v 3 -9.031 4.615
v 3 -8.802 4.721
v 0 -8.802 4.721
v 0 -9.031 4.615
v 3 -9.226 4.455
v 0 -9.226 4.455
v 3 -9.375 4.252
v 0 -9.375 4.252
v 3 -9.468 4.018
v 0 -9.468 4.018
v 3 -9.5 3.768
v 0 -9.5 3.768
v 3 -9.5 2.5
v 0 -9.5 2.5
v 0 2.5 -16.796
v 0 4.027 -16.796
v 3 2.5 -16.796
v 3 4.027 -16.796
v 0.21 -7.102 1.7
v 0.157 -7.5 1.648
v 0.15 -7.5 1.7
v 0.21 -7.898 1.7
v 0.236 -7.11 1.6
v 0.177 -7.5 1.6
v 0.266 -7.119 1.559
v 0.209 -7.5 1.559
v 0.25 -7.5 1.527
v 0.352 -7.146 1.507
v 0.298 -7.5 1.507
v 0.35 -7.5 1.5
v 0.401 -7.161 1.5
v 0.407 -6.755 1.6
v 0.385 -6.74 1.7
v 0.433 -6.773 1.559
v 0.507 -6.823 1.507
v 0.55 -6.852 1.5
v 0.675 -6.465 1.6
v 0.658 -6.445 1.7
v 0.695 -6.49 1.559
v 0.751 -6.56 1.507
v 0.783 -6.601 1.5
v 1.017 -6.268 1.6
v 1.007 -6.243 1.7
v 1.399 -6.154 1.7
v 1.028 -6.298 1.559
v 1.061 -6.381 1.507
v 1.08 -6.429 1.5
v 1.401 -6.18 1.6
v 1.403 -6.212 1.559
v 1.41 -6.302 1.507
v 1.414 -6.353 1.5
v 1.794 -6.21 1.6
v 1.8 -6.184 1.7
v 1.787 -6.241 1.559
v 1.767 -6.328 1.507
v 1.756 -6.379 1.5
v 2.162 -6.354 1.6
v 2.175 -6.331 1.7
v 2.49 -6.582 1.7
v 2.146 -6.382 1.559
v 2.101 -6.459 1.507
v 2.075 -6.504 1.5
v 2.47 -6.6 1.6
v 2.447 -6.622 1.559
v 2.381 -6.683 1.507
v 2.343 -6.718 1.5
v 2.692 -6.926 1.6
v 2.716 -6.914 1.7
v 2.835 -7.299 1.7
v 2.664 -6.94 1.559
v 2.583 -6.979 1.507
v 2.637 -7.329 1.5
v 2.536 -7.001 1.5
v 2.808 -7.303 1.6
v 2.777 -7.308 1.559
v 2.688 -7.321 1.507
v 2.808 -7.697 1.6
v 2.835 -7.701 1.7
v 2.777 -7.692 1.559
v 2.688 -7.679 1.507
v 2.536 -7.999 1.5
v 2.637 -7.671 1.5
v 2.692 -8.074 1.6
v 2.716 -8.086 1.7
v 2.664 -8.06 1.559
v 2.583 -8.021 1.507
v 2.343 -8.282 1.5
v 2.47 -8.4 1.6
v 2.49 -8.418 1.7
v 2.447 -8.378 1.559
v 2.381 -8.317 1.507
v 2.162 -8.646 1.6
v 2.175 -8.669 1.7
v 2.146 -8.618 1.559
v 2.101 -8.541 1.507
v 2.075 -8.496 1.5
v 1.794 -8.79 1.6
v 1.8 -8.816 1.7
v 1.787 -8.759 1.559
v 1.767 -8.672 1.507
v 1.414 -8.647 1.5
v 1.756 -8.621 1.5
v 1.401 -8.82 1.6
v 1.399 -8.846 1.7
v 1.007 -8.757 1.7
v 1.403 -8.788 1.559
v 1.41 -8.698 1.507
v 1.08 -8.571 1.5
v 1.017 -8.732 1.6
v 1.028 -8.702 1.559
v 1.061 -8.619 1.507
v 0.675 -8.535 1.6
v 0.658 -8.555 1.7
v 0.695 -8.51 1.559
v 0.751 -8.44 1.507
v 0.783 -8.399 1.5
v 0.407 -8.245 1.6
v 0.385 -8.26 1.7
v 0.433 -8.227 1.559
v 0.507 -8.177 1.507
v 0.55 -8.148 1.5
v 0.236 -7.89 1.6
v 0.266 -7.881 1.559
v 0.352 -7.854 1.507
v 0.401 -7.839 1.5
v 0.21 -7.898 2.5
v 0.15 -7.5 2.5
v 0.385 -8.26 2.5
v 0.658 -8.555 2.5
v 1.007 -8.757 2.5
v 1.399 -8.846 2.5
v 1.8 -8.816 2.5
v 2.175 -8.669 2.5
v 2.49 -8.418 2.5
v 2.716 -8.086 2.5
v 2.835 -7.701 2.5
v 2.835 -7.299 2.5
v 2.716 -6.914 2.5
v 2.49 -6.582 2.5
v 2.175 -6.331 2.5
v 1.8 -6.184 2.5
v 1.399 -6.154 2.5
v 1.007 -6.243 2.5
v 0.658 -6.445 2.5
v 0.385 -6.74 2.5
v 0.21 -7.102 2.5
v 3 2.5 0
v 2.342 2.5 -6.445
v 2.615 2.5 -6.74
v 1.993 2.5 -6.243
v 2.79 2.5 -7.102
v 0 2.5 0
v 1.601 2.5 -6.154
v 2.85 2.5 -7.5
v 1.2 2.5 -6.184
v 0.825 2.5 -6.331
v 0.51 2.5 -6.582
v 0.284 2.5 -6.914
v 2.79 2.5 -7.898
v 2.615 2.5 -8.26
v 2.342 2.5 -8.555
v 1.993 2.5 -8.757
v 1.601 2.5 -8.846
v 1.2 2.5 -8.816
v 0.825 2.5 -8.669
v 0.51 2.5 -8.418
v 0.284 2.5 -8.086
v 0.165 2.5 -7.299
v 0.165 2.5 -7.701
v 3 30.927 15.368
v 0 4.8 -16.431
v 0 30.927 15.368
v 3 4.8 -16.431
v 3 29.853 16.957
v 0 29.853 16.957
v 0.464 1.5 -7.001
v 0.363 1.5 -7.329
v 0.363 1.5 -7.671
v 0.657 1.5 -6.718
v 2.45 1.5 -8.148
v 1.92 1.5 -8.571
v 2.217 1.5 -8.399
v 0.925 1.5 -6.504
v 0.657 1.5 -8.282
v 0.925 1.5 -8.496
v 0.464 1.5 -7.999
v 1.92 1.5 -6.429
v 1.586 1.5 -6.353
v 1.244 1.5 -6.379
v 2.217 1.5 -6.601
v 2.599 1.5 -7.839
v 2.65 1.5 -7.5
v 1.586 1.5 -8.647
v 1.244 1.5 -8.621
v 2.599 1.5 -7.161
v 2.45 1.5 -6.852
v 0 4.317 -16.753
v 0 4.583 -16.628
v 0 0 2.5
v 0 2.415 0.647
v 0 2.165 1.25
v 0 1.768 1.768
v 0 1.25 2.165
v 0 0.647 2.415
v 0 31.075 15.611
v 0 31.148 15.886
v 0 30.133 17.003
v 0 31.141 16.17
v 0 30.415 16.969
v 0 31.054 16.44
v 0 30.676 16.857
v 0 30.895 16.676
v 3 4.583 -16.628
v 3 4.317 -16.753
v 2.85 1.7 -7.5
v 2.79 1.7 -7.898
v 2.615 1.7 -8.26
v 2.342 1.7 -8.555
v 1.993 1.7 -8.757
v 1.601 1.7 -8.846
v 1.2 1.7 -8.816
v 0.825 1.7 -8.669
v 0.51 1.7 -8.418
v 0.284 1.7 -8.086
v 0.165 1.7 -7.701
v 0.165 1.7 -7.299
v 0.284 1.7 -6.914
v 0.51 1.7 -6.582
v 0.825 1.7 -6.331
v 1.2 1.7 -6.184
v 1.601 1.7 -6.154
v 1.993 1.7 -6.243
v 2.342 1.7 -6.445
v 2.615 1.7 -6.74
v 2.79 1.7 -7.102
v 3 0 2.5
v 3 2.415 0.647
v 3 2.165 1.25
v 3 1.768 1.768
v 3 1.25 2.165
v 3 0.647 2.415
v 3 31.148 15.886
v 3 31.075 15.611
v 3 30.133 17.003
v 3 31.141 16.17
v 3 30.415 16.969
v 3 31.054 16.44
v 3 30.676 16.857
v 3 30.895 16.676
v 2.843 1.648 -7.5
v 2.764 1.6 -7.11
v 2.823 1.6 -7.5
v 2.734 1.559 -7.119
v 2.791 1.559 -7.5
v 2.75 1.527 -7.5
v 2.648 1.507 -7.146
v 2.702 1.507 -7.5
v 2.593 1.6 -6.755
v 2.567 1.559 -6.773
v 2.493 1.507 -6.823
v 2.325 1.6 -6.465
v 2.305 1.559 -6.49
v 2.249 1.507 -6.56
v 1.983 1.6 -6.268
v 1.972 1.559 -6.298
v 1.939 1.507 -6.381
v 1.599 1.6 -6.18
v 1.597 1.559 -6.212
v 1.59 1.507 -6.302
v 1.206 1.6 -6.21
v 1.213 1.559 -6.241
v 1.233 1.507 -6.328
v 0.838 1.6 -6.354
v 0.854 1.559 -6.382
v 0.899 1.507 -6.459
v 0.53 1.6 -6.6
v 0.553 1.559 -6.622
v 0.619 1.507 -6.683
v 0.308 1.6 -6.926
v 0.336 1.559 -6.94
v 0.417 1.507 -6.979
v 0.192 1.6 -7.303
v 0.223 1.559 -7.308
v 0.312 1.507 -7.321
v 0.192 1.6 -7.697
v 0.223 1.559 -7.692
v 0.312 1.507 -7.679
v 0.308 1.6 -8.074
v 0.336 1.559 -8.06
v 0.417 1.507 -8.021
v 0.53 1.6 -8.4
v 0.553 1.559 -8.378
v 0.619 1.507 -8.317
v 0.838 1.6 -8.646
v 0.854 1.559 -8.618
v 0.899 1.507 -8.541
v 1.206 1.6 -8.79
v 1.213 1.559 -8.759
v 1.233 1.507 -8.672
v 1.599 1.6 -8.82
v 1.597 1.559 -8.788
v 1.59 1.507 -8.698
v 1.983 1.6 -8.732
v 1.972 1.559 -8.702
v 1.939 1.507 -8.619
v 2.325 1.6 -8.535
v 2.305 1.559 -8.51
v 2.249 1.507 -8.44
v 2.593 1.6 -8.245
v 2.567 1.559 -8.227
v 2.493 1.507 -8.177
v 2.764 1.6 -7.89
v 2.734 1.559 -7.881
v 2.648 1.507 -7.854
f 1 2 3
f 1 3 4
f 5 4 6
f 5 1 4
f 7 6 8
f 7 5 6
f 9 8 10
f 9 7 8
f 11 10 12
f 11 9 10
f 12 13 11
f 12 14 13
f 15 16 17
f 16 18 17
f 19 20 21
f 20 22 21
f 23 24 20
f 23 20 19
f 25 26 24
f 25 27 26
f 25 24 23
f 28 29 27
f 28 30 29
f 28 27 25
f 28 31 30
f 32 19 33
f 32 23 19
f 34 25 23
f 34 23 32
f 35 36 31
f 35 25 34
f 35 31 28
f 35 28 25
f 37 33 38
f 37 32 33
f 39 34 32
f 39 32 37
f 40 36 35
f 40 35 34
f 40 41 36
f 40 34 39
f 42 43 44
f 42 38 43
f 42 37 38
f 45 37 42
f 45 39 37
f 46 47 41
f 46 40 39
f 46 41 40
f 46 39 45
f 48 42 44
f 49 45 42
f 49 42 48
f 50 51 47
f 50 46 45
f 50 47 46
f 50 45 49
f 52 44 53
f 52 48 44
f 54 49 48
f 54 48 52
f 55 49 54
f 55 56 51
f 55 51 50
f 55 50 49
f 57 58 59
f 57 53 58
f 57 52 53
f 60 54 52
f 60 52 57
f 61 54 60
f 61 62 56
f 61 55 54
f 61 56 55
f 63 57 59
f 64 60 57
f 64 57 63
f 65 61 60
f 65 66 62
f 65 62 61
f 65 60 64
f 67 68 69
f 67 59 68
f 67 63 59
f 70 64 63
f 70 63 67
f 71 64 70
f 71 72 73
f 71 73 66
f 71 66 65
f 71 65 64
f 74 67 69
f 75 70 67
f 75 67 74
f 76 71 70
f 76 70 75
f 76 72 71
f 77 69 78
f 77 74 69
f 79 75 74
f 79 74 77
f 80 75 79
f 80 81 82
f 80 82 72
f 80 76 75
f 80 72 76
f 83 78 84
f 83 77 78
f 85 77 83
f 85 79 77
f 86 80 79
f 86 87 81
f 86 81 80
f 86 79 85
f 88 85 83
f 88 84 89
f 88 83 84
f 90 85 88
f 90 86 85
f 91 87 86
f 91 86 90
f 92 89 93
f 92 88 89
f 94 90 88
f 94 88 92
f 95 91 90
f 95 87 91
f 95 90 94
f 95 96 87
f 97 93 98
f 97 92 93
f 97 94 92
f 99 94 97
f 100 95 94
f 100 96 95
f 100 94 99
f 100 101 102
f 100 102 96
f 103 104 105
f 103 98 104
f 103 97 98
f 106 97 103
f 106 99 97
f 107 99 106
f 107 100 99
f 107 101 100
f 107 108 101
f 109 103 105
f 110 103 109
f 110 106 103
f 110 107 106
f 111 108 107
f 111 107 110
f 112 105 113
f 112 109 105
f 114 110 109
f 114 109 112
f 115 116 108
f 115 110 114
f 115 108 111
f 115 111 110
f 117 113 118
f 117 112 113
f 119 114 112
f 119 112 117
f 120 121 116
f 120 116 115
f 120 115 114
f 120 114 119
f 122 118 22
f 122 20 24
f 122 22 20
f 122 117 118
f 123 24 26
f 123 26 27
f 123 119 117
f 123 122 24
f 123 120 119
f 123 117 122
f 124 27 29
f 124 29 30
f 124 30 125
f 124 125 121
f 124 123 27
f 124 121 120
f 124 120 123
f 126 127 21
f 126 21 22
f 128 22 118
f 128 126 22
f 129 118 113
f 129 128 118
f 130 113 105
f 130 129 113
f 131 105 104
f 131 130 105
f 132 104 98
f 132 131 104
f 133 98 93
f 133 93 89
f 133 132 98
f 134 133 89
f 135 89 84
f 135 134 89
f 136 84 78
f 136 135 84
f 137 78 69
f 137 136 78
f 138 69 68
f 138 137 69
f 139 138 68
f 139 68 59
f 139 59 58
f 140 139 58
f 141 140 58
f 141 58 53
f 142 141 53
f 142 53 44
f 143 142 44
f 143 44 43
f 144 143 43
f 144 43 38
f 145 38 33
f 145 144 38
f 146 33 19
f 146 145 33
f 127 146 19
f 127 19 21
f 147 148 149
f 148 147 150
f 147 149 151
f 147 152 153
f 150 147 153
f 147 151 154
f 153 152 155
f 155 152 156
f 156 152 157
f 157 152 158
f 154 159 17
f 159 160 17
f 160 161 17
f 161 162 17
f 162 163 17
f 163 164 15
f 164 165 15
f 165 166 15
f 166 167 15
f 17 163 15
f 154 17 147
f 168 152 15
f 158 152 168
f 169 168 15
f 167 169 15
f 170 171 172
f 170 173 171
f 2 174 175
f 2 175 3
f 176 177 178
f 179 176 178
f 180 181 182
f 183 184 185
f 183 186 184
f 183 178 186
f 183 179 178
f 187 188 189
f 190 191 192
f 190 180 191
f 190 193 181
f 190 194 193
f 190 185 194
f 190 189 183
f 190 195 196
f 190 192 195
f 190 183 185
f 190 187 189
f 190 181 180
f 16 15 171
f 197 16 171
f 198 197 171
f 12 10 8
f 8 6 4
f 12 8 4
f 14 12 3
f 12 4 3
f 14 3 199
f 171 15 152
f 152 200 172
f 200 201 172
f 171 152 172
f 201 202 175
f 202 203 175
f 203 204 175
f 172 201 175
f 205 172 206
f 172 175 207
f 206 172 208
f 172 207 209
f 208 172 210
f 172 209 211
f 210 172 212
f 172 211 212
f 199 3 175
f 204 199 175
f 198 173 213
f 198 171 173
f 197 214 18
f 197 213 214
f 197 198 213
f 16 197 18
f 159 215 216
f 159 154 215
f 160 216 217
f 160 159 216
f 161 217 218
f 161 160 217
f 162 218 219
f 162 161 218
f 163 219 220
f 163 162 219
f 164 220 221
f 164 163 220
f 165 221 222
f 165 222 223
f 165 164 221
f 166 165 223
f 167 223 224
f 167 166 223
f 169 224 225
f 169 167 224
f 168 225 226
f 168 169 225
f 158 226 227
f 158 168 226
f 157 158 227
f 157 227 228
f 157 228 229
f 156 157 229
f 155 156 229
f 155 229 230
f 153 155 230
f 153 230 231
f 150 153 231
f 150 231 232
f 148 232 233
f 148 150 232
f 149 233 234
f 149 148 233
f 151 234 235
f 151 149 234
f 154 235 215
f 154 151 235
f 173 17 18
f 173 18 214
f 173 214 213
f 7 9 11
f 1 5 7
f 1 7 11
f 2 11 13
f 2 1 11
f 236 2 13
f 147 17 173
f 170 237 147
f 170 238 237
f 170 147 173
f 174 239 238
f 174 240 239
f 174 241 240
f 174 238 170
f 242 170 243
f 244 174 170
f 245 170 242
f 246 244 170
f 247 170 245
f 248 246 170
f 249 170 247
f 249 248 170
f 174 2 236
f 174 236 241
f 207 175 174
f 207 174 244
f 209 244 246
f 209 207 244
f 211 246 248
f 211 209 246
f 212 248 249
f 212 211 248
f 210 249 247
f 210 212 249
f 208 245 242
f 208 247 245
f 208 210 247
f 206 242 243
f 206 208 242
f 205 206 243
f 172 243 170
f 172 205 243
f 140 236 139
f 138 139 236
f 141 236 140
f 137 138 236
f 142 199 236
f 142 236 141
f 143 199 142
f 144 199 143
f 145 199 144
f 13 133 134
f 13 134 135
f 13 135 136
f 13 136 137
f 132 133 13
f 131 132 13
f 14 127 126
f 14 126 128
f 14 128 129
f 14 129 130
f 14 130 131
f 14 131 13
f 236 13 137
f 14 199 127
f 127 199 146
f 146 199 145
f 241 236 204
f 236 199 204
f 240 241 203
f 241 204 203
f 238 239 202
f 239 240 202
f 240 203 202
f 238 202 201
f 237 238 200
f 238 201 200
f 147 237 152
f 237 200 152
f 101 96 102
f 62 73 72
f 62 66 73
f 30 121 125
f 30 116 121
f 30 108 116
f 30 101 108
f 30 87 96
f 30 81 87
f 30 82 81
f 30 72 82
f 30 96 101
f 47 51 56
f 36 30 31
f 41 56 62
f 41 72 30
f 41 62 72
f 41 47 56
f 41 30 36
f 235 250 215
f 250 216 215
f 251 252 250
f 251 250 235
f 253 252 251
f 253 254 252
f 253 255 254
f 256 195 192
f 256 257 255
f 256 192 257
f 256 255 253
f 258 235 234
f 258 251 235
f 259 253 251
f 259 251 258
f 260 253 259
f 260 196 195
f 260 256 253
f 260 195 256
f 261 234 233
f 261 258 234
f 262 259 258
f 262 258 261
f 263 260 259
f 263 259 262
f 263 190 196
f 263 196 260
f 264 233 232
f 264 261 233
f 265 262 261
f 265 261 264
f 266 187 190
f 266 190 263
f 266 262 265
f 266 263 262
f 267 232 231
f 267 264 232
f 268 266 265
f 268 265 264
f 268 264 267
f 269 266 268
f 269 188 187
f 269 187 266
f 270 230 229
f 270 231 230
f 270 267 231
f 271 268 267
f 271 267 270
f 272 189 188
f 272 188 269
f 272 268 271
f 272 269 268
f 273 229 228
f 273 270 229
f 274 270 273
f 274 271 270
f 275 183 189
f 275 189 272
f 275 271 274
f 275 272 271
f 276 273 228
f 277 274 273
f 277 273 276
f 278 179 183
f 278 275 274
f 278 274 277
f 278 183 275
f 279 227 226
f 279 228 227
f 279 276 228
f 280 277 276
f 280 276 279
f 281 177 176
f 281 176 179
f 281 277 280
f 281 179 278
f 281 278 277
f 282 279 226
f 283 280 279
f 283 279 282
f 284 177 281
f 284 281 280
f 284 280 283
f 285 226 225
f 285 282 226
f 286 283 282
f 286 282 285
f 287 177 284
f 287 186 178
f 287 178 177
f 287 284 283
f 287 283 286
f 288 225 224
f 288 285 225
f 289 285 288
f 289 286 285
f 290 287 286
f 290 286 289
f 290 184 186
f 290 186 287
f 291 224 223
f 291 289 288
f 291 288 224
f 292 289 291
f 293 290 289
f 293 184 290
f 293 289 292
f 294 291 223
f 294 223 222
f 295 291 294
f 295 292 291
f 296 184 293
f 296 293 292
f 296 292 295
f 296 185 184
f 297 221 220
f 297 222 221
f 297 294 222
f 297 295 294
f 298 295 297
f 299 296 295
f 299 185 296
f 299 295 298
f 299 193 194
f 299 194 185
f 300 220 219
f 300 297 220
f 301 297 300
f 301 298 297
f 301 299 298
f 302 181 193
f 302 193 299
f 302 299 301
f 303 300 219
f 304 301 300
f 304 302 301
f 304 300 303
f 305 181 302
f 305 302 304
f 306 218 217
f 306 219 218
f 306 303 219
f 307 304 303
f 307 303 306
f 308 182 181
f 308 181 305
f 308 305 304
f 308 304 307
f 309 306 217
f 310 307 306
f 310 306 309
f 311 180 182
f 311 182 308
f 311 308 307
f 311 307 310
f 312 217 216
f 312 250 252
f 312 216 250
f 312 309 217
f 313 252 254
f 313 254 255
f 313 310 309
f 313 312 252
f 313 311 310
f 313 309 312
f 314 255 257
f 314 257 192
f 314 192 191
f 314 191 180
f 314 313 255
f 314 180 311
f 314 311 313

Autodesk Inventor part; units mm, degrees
ref_plane "YZ Plane" through (0, 0, 0) normal (1, 0, 0) x (0, 1, 0)
ref_plane "XZ Plane" through (0, 0, 0) normal (0, 1, 0) x (-1, 0, 0)
ref_plane "XY Plane" through (0, 0, 0) normal (0, 0, 1) x (1, 0, 0)
sketch "Boceto1" plane through (0, 0, 0) normal (1, 0, 0) x (0, 1, 0)
  circle A0 centre (0, 0) radius 2.5
  line L0 (2.5, 0) -> (2.5, 10.6639)
  line L1 (2.5, 2.5) -> (-7.5, 2.5)
  line L2 (-7.5, 2.5) -> (-9.5, 2.5)
  line L3 (-9.5, 2.5) -> (-9.5, 4.5)
  line L4 (-9.5, 4.5) -> (2.5, 4.5)
  line L5 (0, 0) -> (-4.5773, -4.5773)
  line L6 (0, 0) -> (6.4732, 0) construction
  circle A1 centre (0, 0) radius 2.5
  line L7 (0, 2.5) -> (10.6639, 2.5)
  line L8 (2.5, 2.5) -> (2.5, -7.5)
  line L9 (2.5, -7.5) -> (2.5, -9.5)
  line L10 (2.5, -9.5) -> (4.5, -9.5)
  line L11 (4.5, -9.5) -> (4.5, 2.5)
  line L12 (2.5, 4.5) -> (4.5, 4.5)
  line L13 (4.5, 4.5) -> (4.5, 2.5)
  point P0 (0, 2.5)
  dimension "d0" = 5
  dimension "d1" = 10
  dimension "d2" = 2
  dimension "d3" = 2
  dimension "d4" = 135
extrude "Extrusión1" add sketch "Boceto1" along normal blind 3 contours A0 L1 L0 | L0 L7 L11 L10 L9 L8 | L1 L2 L3 L4 L0 | L0 L12 L13 L7
sketch "Boceto2" plane through (3, 0, 0) normal (1, 0, 0) x (0, 0, -1)
  line L0 (16.7965, 4.5) -> (-17.9745, 33.0686)
  line L1 (-4.5, 4.5) -> (-4.5, -9.5) projected
  line L2 (-17.9745, 33.0686) -> (-4.5, -9.5)
  line L3 (-2.5, -9.5) -> (-2.5, 0) projected
  arc A0 (0, 2.5) -> (-2.5, 0) centre (0, 0) ccw projected
  line L4 (0, 2.5) -> (9.5, 2.5) projected
  line L5 (9.5, 2.5) -> (9.5, 4.5) projected
  line L6 (9.5, 4.5) -> (-4.5, 4.5) projected
  line L7 (-4.5, 4.5) -> (-4.5, -9.5) projected
  line L8 (-4.5, -9.5) -> (-2.5, -9.5) projected
  line L9 (9.5, 2.5) -> (9.5, 4.5) projected
  line L10 (9.5, 4.5) -> (16.7965, 4.5)
  line L11 (16.7965, 2.5) -> (9.5, 2.5)
  line L12 (9.5, 2.5) -> (16.7965, 2.5)
  line L13 (16.7965, 4.5) -> (16.7965, 2.5)
extrude "Extrusión2" add sketch "Boceto2" against normal blind 3 contours L10 L6 L1 L2 L0 | L13 L11 L5 L10
sketch "Boceto3" plane through (0, 2.5, -9.5) normal (0, -1, 0) x (1, 0, 0)
  line L0 (0, 0) -> (3, 0) projected
  line L1 (1.5, 0) -> (1.5, 2)
  circle A0 centre (1.5, 2) radius 1.35
  point P0 (0, 9.5)
  dimension "d9" = 2
  dimension "d10" = 2.7
extrude "Extrusión3" add sketch "Boceto3" along normal blind 1
fillet "Empalme1" radius 0.2 1 edges at (0.15, 1.5, -7.5)
sketch "Boceto4" plane through (0, -9.5, 2.5) normal (0, 0, -1) x (-1, 0, 0)
  line L0 (0, 0) -> (-3, 0) projected
  line L1 (-1.5, 0) -> (-1.5, 2)
  circle A0 centre (-1.5, 2) radius 1.35
  point P0 (0, 9.5)
  dimension "d14" = 2
  dimension "d15" = 2.7
extrude "Extrusión4" add sketch "Boceto4" along normal blind 1
fillet "Empalme2" radius 0.2 1 edges at (2.85, -7.5, 1.5)
fillet "Empalme3" radius 1 3 edges at (1.5, 4.5, -16.7965) (1.5, -9.5, 4.5) (1.5, 33.0686, 17.9745)
properties part number "gato"
